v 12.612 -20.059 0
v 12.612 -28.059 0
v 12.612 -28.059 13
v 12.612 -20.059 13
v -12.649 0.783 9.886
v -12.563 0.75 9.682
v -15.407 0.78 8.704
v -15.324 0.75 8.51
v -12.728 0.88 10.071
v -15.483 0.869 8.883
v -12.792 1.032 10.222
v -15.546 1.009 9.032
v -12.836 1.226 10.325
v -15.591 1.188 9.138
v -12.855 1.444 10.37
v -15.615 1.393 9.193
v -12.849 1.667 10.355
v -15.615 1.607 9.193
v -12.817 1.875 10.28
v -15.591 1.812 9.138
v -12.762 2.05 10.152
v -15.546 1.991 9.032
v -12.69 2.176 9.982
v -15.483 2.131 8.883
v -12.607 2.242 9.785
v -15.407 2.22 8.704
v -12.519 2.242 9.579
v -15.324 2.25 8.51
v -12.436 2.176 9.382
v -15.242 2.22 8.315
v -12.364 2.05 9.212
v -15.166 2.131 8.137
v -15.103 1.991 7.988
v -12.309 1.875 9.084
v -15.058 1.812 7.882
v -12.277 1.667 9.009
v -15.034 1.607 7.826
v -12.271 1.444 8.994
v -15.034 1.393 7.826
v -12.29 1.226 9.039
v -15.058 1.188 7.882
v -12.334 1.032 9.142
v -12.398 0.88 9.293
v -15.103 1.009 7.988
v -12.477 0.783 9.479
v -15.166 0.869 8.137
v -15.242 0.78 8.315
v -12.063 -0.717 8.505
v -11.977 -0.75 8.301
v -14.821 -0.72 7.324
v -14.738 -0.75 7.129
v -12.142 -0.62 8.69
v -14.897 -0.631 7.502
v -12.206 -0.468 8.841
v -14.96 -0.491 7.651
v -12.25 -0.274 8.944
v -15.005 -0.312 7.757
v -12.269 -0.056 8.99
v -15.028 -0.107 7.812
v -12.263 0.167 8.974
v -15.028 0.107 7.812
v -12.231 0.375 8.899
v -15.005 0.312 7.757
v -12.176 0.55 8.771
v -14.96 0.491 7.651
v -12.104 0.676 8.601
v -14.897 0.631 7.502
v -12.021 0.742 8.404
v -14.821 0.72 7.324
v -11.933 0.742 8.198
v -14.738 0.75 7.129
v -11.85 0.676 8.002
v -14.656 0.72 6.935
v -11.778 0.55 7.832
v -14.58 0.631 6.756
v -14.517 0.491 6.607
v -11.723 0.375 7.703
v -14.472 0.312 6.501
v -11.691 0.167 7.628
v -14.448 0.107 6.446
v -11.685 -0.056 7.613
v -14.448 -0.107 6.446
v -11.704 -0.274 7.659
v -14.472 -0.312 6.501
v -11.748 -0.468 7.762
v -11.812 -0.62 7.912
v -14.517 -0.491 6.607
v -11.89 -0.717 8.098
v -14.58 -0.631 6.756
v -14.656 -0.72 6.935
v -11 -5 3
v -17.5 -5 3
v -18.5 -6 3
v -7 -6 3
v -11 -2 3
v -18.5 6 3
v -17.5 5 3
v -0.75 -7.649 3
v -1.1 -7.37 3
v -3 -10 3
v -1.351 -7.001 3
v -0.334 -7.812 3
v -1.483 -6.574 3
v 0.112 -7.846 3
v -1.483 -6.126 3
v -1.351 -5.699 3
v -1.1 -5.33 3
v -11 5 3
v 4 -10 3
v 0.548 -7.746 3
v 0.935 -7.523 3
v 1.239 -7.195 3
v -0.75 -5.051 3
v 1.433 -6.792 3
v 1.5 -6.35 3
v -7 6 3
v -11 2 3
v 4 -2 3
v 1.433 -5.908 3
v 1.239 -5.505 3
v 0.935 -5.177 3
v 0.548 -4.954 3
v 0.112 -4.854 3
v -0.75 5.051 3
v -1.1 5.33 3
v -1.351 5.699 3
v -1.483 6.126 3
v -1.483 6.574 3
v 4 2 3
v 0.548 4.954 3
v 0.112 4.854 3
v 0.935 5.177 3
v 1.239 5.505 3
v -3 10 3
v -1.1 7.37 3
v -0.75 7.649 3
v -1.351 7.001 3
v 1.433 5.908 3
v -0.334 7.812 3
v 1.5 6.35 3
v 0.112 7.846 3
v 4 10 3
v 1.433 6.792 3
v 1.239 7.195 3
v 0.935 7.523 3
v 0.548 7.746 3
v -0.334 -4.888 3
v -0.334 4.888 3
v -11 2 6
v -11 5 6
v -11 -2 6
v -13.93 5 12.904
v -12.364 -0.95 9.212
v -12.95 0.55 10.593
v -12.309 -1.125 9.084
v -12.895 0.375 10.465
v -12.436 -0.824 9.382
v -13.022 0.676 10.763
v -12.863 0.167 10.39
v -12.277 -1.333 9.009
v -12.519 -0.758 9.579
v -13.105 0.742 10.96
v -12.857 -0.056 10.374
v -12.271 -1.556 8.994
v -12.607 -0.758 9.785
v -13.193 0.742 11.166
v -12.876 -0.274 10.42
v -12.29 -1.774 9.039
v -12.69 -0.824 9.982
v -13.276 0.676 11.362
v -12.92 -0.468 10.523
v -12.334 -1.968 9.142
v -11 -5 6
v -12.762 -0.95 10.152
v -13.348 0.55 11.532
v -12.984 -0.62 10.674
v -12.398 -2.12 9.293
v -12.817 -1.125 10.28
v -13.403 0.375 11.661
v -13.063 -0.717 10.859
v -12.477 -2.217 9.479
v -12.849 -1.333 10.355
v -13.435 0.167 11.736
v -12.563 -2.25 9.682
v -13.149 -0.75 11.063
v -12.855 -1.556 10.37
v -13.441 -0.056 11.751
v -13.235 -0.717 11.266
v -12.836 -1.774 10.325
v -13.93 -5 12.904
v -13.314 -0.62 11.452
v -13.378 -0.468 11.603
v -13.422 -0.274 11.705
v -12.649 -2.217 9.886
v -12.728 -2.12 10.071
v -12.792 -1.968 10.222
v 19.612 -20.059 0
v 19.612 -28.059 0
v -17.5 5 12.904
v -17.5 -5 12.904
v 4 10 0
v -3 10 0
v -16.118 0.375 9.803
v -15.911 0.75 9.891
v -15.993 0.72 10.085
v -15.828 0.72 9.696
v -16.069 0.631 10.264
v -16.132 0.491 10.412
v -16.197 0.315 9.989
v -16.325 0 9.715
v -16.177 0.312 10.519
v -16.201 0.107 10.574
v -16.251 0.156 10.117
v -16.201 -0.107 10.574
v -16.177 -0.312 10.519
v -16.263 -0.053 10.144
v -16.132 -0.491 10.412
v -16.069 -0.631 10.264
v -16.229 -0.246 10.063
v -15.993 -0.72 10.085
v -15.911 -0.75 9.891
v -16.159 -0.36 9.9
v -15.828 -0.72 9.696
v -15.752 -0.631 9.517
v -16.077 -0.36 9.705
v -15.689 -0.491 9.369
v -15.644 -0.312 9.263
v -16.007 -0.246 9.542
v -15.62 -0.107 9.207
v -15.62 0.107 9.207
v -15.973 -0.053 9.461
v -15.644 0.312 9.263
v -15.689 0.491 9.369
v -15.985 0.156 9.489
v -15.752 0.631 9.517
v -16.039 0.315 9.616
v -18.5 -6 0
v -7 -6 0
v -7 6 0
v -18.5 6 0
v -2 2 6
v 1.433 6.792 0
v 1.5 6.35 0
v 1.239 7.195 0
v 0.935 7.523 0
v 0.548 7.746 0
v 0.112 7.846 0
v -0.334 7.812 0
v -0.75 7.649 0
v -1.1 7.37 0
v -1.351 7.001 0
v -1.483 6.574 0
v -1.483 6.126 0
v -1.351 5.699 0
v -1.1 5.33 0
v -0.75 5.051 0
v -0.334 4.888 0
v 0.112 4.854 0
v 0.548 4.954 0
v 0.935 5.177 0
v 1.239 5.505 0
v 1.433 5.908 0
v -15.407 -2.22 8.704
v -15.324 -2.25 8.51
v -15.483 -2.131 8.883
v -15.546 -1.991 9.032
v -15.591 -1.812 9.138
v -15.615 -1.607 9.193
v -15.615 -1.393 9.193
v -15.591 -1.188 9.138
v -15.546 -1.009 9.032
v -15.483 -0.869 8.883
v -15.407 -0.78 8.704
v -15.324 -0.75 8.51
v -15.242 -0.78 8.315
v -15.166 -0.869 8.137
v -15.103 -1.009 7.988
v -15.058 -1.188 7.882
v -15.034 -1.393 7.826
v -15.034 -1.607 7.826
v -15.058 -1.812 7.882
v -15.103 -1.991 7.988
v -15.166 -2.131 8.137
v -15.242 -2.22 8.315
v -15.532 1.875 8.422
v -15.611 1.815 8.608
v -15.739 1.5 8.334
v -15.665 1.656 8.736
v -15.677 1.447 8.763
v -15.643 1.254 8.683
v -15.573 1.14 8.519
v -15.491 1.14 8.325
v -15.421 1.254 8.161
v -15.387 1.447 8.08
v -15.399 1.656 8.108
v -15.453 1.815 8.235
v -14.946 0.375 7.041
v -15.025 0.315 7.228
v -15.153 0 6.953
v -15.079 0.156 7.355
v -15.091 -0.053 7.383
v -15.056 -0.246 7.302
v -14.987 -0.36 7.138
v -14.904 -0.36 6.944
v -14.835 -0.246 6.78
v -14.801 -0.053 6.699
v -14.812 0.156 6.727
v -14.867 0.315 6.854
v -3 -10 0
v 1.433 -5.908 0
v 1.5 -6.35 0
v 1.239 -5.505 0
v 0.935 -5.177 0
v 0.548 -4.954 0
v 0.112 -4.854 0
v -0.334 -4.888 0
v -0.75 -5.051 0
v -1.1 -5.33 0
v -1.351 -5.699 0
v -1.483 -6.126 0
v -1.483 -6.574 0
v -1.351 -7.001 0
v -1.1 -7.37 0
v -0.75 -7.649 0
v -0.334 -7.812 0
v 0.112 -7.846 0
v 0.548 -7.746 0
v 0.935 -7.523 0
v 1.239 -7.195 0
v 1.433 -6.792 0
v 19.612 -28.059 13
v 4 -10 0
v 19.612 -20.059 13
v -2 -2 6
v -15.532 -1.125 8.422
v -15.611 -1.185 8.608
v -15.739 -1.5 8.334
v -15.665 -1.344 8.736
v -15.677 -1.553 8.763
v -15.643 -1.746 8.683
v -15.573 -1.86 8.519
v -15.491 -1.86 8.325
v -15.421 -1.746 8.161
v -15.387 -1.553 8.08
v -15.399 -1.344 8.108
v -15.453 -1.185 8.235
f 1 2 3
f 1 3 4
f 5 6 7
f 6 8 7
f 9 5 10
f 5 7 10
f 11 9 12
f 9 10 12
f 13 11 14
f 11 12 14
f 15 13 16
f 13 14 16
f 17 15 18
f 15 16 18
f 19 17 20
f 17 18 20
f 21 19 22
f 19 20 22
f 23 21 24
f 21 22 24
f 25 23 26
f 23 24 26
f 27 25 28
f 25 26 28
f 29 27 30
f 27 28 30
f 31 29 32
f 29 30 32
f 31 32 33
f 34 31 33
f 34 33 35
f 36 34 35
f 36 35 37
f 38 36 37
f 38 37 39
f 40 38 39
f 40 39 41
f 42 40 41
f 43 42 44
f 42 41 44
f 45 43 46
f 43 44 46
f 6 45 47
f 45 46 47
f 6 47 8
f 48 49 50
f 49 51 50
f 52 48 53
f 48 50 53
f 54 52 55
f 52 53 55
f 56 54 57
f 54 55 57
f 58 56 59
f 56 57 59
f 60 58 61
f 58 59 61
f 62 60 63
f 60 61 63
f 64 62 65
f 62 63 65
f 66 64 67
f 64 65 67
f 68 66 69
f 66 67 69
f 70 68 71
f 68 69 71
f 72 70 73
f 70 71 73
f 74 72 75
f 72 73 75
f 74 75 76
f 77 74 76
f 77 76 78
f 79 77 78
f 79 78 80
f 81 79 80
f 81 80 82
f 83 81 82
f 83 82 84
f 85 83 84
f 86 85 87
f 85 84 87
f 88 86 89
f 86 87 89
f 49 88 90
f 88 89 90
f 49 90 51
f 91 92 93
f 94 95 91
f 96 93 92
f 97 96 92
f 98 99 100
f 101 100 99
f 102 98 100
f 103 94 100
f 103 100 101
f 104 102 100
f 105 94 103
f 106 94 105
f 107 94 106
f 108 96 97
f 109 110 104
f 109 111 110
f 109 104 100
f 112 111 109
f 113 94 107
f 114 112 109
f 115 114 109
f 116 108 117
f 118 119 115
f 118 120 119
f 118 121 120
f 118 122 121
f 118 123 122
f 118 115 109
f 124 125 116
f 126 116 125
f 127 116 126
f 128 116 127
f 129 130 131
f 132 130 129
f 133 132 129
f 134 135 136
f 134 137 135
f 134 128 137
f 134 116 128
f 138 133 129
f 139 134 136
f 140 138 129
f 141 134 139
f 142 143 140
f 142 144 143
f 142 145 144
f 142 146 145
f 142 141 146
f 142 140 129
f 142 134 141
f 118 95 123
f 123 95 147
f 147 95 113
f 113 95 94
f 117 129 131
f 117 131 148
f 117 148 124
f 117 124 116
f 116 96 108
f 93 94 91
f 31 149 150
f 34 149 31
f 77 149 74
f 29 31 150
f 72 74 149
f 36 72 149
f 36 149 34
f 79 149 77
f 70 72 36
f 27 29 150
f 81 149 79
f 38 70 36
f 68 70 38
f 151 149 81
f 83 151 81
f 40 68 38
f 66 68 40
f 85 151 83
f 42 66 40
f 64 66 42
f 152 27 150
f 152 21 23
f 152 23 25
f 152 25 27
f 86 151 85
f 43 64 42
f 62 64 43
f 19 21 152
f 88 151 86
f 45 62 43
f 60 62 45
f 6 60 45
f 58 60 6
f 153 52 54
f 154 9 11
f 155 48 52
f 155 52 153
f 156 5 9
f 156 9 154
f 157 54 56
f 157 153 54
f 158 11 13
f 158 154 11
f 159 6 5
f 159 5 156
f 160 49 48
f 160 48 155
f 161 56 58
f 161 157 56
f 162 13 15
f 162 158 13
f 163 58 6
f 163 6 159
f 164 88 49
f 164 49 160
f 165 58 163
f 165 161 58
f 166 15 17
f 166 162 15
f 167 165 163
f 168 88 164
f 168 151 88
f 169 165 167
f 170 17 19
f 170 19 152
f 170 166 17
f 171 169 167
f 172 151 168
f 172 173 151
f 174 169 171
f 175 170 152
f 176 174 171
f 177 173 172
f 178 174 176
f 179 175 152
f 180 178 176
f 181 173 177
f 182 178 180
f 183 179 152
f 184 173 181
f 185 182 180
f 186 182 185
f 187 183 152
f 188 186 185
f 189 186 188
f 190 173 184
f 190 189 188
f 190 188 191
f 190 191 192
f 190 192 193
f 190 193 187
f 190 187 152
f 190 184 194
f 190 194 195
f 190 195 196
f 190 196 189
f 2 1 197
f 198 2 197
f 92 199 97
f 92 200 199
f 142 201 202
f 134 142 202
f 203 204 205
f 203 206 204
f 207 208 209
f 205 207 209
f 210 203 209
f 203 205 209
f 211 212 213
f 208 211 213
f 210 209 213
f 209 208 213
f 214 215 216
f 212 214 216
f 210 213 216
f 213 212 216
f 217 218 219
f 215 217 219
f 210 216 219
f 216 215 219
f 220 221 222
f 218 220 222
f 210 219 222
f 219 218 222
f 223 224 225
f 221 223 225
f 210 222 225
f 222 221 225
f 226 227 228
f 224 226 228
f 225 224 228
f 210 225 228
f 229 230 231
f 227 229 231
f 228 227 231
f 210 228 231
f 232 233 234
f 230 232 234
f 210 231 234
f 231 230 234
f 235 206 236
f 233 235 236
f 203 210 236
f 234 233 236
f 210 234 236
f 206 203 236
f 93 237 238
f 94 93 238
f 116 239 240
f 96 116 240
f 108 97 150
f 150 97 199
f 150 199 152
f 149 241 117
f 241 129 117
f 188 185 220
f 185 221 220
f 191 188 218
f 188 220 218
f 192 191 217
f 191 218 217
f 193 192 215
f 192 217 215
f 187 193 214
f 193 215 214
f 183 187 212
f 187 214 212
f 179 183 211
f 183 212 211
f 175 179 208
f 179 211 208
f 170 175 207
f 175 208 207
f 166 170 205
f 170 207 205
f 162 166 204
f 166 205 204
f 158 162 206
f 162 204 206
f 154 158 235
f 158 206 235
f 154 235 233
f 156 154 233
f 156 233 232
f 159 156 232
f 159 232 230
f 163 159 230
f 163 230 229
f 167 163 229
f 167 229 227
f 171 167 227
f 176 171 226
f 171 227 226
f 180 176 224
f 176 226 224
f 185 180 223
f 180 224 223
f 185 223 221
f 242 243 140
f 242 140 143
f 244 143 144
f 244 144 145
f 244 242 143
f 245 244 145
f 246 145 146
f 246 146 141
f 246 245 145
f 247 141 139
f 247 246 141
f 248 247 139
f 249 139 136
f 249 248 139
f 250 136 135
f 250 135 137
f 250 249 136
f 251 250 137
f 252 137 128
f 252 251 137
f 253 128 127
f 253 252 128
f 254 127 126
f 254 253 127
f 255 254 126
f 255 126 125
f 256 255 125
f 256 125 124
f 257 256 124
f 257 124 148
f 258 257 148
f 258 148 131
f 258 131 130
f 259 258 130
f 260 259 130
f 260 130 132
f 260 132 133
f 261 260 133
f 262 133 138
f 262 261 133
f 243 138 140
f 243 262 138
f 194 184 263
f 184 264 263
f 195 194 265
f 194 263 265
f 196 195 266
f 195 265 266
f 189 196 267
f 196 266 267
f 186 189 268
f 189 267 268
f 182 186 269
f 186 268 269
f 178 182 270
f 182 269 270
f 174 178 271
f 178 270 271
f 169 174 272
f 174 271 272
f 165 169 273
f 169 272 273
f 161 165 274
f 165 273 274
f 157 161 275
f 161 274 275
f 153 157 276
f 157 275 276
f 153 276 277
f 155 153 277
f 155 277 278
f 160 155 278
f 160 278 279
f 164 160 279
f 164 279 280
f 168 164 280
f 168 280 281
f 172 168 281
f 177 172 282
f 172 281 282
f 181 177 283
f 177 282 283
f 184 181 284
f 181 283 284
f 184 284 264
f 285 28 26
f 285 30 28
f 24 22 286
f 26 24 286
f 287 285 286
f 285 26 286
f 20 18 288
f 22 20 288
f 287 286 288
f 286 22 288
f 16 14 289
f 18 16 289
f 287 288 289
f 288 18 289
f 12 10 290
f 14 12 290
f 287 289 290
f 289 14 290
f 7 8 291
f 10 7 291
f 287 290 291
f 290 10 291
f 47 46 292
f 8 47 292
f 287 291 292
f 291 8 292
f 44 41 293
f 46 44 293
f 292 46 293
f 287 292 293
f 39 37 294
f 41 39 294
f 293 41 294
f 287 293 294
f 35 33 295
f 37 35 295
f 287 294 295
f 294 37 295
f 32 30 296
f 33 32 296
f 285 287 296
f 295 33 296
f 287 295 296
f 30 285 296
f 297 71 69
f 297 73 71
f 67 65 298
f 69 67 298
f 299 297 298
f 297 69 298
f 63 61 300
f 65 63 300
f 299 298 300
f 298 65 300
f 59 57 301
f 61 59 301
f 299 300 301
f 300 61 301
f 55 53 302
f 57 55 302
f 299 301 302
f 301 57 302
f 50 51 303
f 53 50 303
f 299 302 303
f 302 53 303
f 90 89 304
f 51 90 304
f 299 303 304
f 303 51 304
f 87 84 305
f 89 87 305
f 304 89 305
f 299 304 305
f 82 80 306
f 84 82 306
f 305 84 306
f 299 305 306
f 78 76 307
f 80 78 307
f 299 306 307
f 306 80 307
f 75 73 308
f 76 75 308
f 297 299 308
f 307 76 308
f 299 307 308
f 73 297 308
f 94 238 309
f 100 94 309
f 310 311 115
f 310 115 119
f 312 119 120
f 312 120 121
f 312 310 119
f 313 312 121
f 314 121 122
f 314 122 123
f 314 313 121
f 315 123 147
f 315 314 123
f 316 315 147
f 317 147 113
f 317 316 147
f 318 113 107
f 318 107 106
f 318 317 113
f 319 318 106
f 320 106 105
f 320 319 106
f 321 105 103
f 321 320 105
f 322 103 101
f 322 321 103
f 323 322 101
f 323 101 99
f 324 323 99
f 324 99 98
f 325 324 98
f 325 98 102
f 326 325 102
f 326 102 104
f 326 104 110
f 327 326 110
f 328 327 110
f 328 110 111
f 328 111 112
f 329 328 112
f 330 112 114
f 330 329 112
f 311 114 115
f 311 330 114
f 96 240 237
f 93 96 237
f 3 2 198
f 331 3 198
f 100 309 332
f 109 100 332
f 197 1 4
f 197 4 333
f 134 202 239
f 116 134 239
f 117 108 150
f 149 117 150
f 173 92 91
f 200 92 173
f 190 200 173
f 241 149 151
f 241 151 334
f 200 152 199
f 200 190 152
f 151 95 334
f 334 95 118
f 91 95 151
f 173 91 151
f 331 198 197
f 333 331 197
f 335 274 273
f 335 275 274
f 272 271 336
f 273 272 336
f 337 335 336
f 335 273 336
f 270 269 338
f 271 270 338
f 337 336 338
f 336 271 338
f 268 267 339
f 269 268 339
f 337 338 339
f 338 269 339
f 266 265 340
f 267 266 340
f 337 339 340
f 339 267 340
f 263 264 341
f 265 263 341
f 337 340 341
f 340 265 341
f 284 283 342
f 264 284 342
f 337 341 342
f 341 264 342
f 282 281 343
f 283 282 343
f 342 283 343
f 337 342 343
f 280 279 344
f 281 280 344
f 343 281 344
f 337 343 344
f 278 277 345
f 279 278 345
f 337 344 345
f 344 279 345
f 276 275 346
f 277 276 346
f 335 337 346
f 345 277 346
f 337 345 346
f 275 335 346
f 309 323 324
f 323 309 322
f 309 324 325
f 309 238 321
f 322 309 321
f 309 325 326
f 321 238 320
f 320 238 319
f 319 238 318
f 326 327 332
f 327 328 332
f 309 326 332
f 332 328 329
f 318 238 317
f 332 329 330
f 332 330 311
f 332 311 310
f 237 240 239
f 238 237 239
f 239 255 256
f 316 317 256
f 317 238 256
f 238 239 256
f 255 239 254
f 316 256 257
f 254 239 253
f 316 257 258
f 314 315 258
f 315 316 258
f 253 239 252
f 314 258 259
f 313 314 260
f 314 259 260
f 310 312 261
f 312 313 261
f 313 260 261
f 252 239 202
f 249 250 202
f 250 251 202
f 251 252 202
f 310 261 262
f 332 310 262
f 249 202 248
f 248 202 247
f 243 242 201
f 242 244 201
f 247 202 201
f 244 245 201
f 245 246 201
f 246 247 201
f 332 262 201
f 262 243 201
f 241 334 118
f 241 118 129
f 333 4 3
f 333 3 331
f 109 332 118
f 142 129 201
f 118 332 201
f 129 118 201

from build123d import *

# Parameters (mm, degrees)
F0_R          = 1.5
F1_DEPTH      = 3
F3_DEPTH      = 5
F3_DEPTH_BACK = 5
F5_D          = 1.5
F5_DEPTH      = 3
F5_TIP        = 0.4506454643
F7_DEPTH      = 3
F8_SIZE2      = 6
F8_SIZE       = 3
F0_W          = 7
F0_H          = 8
F9_DEPTH      = 13


with BuildPart() as f1:
    # F0 (on Top) → F1 (new body)
    with BuildSketch(Plane.XY):
        Polygon((4, -10), (4, 0), (4, 10), (-3, 10), (-7, 6), (-18.5, 6), (-18.5, 0), (-18.5, -6), (-7, -6), (-3, -10), align=None)
        with Locations((0, -6.35)):
            Circle(F0_R, mode=Mode.SUBTRACT)
        with Locations((0, 6.35)):
            Circle(F0_R, mode=Mode.SUBTRACT)
    extrude(amount=F1_DEPTH)

    # F2 (on Front) → F3 (join, two sides)
    with BuildSketch(Plane.XZ) as f3_sk:
        Polygon((-17.5, 12.9037864009), (-17.5, 3), (-11, 3), (-11, 6), (-13.9304834637, 12.9037864009), align=None)
    extrude(amount=F3_DEPTH)
    extrude(f3_sk.sketch, amount=-F3_DEPTH_BACK)

    # F5
    with Locations(Plane(origin=(-7.1626016365, 0, -3.0403440132), x_dir=(0, 1, 0), z_dir=(0.9205048535, 0, 0.3907311285))):
        with Locations((0, 15.3210715341), (1.5, 13.8210715341), (0, 12.3210715341), (-1.5, 13.8210715341)):
            Hole(F5_D / 2, depth=F5_DEPTH)
            with Locations((0, 0, -(F5_DEPTH + F5_TIP / 2))):  # 118° drill point
                Cone(0, F5_D / 2, F5_TIP, mode=Mode.SUBTRACT)

    # F6 (on face) → F7 (join)
    with BuildSketch(Plane.XY.offset(3)):
        Polygon((4, -2), (4, 2), (-4, 2), (-11, 2), (-11, -2), (-4, -2), align=None)
    extrude(amount=F7_DEPTH)

    # F8
    f8_edges = [f1.edges().sort_by_distance(p)[0] for p in [
        (4, 0, 6),
    ]]
    f8_side = f1.faces().sort_by_distance((4, 0, 2))[0]
    chamfer(f8_edges, length=F8_SIZE, length2=F8_SIZE2, reference=f8_side)


with BuildPart() as f9:
    # F0 (on Top) → F9 (new body)
    with BuildSketch(Plane.XY):
        with Locations((16.1121446267, -24.0593857169)):
            Rectangle(F0_W, F0_H)
    extrude(amount=F9_DEPTH)


solid = Compound([f1.part, f9.part])
